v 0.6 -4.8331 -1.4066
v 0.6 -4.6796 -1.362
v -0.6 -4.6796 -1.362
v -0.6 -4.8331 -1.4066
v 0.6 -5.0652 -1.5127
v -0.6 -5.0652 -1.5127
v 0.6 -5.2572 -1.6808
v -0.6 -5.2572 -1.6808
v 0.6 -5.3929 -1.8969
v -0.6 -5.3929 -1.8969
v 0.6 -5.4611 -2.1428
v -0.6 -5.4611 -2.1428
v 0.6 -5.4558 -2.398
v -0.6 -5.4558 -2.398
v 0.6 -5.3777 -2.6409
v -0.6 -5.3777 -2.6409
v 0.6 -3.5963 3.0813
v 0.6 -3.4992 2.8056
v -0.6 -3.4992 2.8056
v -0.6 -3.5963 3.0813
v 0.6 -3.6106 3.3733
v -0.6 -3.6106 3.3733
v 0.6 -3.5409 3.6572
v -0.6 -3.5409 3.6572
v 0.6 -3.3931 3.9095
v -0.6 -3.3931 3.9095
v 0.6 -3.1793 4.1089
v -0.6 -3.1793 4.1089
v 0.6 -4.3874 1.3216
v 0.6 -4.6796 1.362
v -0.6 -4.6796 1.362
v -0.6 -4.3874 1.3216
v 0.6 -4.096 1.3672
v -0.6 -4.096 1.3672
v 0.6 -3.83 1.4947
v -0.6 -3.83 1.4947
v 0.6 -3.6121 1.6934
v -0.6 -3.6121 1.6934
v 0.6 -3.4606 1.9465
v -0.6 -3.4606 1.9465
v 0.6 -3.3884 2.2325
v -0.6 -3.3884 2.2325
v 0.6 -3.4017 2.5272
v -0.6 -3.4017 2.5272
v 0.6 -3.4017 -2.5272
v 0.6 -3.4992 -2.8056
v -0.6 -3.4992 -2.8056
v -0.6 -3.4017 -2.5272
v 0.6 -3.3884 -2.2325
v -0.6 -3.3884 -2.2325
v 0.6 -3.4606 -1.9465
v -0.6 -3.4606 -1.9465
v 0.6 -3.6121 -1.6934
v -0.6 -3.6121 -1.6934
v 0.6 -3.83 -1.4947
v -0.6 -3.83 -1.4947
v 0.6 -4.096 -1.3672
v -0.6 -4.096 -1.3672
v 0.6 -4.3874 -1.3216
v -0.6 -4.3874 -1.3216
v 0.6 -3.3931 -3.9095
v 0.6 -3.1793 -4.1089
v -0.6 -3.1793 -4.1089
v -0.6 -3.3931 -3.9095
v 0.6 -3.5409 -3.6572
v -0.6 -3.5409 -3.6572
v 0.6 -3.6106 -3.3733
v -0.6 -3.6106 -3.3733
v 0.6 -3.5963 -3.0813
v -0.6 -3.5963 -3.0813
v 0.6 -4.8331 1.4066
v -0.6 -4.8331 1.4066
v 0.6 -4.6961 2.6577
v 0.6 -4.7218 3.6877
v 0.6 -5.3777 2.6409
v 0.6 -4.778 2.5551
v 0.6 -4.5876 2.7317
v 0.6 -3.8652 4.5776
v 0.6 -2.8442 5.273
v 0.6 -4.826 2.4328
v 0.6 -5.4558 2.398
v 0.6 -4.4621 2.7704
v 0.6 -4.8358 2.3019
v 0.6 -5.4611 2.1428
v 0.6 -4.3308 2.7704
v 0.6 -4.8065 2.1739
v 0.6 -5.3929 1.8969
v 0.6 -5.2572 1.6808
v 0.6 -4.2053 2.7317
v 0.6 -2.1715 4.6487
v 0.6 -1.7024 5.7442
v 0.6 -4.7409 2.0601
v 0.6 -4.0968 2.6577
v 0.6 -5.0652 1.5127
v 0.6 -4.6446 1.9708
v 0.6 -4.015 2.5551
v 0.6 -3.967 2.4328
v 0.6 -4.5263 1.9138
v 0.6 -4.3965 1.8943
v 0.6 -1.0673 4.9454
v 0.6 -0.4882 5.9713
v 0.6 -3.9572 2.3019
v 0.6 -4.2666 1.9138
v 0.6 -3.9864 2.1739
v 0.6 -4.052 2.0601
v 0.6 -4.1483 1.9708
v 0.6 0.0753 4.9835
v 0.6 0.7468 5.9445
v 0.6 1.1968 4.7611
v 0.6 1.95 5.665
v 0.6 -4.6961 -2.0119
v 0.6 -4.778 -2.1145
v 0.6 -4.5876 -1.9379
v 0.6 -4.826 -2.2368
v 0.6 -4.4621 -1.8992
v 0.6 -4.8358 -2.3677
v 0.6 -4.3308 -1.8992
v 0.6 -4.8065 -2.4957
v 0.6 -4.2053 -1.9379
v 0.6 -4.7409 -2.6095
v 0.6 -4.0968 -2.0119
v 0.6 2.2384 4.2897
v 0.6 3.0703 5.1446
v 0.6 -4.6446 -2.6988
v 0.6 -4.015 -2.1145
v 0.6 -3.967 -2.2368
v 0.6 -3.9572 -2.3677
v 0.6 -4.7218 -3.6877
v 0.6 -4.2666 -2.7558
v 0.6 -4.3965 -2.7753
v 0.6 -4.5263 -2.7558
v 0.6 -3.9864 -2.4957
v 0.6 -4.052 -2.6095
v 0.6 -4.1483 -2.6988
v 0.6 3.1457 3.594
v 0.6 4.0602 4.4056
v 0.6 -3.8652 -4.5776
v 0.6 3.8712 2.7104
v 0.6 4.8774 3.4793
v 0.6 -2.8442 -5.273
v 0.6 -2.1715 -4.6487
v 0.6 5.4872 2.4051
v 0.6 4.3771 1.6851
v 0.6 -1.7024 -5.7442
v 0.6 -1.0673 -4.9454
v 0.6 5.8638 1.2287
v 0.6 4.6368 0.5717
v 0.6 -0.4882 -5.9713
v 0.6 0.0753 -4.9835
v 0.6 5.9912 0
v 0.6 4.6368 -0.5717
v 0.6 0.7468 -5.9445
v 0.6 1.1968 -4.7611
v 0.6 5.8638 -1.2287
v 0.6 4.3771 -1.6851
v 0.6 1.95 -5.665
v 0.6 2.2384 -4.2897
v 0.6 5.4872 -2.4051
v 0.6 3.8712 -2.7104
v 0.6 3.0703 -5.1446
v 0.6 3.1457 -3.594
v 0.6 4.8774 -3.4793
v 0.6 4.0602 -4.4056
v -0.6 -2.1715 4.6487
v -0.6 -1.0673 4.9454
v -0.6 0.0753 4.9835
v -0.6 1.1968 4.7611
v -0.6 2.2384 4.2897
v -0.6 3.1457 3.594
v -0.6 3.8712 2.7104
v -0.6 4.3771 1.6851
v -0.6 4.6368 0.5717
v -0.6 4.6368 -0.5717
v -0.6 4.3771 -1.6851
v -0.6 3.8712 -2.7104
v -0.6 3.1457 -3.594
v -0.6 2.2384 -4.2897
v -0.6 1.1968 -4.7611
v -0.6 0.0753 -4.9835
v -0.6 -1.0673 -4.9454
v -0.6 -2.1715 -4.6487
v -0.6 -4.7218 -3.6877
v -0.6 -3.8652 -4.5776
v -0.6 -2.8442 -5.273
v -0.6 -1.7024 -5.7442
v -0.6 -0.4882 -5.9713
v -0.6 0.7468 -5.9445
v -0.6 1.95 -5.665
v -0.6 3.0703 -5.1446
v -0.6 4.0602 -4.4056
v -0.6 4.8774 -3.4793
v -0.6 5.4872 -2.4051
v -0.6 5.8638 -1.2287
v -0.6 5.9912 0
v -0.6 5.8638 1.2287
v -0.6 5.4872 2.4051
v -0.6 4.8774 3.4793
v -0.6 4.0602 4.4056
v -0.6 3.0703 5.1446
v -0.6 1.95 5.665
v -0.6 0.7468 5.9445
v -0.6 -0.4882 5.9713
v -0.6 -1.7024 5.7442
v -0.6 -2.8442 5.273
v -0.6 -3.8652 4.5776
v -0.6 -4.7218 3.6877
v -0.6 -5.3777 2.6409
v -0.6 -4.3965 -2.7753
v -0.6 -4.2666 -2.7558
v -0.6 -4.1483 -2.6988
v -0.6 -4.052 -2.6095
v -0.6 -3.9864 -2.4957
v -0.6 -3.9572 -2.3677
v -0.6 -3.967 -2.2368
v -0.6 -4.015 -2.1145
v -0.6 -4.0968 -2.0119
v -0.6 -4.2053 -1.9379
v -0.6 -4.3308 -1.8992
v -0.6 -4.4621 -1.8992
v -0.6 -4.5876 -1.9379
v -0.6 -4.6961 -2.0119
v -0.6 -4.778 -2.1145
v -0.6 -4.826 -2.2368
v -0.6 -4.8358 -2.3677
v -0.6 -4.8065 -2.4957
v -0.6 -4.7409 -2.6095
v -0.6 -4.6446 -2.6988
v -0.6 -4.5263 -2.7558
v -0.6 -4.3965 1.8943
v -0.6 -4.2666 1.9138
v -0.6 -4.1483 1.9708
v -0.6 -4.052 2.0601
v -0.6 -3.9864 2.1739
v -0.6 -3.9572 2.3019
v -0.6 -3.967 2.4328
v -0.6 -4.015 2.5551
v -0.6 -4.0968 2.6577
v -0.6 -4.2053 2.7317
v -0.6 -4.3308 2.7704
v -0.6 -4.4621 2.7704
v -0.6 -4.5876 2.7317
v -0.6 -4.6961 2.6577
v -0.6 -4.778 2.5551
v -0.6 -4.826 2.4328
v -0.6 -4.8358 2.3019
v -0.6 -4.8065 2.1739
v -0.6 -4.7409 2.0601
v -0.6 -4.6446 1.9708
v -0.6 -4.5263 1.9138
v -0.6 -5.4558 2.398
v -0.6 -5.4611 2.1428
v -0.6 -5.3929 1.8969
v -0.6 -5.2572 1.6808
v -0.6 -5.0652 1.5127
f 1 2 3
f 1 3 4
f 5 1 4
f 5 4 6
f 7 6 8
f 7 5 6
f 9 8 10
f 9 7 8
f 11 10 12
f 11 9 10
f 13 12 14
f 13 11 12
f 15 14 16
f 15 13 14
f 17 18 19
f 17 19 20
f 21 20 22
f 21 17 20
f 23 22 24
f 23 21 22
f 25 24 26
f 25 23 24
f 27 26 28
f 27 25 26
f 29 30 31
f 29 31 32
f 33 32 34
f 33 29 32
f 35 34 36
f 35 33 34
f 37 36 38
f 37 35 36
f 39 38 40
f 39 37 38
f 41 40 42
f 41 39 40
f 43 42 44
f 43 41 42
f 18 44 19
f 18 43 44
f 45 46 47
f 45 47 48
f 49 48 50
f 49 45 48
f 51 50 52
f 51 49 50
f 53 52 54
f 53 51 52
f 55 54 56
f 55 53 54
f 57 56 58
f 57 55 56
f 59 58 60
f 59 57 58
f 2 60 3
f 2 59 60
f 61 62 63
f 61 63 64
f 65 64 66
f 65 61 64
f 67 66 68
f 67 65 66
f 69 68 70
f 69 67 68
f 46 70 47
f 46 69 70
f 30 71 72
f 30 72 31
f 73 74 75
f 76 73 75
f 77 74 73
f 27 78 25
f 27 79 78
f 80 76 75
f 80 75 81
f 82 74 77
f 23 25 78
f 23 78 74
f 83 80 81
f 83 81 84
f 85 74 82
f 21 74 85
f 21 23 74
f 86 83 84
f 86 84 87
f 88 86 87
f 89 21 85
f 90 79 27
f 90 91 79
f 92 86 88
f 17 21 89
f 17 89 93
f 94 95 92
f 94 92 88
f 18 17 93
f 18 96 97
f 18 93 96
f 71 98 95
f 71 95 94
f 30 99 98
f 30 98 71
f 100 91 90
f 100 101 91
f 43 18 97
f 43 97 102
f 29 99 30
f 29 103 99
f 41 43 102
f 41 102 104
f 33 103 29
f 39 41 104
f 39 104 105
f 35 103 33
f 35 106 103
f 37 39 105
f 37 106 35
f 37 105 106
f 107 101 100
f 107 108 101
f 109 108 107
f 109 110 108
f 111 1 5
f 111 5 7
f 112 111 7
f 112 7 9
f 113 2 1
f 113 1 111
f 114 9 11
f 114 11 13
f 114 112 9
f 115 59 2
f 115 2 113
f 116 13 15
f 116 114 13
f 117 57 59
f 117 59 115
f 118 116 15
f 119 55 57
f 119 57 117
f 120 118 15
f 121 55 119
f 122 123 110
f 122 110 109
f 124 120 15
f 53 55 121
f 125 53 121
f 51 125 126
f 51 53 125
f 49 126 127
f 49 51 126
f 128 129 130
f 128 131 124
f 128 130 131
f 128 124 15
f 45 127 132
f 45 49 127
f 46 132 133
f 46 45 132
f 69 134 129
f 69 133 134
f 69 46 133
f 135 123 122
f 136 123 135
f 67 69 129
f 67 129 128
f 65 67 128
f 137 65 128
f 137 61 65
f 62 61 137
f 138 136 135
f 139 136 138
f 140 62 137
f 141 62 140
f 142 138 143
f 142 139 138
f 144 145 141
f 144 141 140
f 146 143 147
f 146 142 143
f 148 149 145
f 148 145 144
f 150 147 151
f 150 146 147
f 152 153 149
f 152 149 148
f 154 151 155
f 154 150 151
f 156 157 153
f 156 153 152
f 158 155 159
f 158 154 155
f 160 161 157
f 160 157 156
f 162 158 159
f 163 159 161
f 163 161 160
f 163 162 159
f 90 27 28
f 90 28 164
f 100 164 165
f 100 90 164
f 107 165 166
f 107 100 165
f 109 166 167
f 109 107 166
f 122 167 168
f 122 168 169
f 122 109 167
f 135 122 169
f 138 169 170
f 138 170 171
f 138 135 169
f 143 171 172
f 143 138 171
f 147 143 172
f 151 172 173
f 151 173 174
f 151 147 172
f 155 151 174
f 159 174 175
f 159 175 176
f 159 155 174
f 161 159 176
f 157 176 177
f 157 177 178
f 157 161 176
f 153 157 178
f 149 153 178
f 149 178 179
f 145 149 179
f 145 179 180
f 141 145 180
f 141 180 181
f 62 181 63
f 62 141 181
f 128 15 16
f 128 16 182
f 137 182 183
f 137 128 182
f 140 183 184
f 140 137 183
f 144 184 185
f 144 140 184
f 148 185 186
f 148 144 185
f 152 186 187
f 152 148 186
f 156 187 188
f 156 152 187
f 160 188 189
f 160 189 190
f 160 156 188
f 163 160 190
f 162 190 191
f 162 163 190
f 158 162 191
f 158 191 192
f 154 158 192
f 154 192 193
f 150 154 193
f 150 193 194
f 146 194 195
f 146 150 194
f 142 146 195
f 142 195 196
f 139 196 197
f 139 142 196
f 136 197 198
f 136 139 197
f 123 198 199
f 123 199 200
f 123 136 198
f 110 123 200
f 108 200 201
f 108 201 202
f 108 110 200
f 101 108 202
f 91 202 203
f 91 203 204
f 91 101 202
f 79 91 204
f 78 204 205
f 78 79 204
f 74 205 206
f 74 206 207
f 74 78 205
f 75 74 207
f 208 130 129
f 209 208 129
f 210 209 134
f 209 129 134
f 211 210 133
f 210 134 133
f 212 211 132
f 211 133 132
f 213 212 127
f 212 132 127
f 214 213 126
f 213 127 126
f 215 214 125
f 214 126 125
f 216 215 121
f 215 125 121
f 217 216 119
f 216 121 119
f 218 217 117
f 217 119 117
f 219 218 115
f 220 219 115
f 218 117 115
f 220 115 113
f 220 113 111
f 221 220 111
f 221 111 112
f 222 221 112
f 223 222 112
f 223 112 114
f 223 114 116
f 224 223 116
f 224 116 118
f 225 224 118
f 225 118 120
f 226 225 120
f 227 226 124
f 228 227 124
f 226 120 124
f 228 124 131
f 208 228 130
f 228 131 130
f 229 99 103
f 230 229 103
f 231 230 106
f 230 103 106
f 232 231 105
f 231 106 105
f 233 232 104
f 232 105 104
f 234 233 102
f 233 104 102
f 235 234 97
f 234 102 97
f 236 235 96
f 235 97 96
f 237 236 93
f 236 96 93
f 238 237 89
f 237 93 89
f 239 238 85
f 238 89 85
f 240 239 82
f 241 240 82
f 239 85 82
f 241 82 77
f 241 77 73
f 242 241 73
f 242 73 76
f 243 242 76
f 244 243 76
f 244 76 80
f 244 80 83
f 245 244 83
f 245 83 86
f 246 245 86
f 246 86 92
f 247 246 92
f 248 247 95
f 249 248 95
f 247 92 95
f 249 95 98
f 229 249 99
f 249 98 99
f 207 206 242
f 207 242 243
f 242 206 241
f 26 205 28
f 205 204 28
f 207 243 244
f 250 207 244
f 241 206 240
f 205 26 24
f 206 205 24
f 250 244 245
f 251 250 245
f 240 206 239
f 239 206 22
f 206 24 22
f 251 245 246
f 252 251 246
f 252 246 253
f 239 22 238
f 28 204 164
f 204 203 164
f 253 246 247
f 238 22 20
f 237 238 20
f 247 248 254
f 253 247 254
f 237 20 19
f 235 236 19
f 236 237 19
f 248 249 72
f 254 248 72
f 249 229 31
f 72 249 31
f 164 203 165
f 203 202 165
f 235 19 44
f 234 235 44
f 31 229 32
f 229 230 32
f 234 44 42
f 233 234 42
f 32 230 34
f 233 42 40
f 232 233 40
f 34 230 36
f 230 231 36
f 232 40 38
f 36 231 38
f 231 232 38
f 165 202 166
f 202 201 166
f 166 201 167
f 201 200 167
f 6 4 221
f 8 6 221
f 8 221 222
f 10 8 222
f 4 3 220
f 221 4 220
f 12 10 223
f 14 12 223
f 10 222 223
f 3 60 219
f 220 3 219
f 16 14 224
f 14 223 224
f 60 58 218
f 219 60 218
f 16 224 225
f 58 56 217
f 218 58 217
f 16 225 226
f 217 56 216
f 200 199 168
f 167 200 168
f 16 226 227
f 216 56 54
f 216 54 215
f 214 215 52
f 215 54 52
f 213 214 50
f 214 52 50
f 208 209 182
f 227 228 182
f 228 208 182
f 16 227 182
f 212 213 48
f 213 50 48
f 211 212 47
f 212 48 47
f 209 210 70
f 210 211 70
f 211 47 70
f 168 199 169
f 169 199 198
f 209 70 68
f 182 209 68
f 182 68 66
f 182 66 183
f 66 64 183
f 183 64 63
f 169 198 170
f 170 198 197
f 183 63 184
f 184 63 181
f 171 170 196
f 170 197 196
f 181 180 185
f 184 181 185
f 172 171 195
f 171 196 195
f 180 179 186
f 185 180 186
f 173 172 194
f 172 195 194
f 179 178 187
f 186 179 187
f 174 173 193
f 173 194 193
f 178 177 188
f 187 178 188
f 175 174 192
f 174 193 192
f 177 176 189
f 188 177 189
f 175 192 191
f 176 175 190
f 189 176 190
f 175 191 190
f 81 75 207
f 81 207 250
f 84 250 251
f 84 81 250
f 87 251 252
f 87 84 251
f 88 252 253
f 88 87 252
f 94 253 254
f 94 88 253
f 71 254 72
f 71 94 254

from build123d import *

# Parameters (mm, degrees)
SKETCH1_R           = 0.440528634
BOSS_EXTRUDE1_DEPTH = 1.2


with BuildPart() as part:
    # Sketch1 → Boss-Extrude1 (new body)
    with BuildSketch(Plane(origin=(0.6, 0, 0), x_dir=(0, 0, -1), z_dir=(1, 0, 0))):
        with BuildLine():
            Line((-1.406616674, -4.833075449), (-1.361950738, -4.679605182))
            ThreePointArc((-1.361950738, -4.679605182), (-1.693445711, -3.612076228), (-2.805550353, -3.499247827))
            ThreePointArc((-2.805550353, -3.499247827), (-3.517808728, -3.586040603), (-4.108949504, -3.179349612))
            ThreePointArc((-4.108949504, -3.179349612), (0, 4.669603524), (4.108949504, -3.179349612))
            ThreePointArc((4.108949504, -3.179349612), (3.517808728, -3.586040603), (2.805550353, -3.499247827))
            ThreePointArc((2.805550353, -3.499247827), (1.693445711, -3.612076228), (1.361950738, -4.679605182))
            Line((1.361950738, -4.679605182), (1.406616674, -4.833075449))
            ThreePointArc((1.406616674, -4.833075449), (1.89690358, -5.392945454), (2.640948929, -5.377707645))
            ThreePointArc((2.640948929, -5.377707645), (0, 5.991189427), (-2.640948929, -5.377707645))
            ThreePointArc((-2.640948929, -5.377707645), (-1.89690358, -5.392945454), (-1.406616674, -4.833075449))
        make_face()
        with Locations((-2.334801762, -4.396466943)):
            Circle(SKETCH1_R, mode=Mode.SUBTRACT)
        with Locations((2.334801762, -4.396466943)):
            Circle(SKETCH1_R, mode=Mode.SUBTRACT)
    extrude(amount=-BOSS_EXTRUDE1_DEPTH)


solid = part.part
